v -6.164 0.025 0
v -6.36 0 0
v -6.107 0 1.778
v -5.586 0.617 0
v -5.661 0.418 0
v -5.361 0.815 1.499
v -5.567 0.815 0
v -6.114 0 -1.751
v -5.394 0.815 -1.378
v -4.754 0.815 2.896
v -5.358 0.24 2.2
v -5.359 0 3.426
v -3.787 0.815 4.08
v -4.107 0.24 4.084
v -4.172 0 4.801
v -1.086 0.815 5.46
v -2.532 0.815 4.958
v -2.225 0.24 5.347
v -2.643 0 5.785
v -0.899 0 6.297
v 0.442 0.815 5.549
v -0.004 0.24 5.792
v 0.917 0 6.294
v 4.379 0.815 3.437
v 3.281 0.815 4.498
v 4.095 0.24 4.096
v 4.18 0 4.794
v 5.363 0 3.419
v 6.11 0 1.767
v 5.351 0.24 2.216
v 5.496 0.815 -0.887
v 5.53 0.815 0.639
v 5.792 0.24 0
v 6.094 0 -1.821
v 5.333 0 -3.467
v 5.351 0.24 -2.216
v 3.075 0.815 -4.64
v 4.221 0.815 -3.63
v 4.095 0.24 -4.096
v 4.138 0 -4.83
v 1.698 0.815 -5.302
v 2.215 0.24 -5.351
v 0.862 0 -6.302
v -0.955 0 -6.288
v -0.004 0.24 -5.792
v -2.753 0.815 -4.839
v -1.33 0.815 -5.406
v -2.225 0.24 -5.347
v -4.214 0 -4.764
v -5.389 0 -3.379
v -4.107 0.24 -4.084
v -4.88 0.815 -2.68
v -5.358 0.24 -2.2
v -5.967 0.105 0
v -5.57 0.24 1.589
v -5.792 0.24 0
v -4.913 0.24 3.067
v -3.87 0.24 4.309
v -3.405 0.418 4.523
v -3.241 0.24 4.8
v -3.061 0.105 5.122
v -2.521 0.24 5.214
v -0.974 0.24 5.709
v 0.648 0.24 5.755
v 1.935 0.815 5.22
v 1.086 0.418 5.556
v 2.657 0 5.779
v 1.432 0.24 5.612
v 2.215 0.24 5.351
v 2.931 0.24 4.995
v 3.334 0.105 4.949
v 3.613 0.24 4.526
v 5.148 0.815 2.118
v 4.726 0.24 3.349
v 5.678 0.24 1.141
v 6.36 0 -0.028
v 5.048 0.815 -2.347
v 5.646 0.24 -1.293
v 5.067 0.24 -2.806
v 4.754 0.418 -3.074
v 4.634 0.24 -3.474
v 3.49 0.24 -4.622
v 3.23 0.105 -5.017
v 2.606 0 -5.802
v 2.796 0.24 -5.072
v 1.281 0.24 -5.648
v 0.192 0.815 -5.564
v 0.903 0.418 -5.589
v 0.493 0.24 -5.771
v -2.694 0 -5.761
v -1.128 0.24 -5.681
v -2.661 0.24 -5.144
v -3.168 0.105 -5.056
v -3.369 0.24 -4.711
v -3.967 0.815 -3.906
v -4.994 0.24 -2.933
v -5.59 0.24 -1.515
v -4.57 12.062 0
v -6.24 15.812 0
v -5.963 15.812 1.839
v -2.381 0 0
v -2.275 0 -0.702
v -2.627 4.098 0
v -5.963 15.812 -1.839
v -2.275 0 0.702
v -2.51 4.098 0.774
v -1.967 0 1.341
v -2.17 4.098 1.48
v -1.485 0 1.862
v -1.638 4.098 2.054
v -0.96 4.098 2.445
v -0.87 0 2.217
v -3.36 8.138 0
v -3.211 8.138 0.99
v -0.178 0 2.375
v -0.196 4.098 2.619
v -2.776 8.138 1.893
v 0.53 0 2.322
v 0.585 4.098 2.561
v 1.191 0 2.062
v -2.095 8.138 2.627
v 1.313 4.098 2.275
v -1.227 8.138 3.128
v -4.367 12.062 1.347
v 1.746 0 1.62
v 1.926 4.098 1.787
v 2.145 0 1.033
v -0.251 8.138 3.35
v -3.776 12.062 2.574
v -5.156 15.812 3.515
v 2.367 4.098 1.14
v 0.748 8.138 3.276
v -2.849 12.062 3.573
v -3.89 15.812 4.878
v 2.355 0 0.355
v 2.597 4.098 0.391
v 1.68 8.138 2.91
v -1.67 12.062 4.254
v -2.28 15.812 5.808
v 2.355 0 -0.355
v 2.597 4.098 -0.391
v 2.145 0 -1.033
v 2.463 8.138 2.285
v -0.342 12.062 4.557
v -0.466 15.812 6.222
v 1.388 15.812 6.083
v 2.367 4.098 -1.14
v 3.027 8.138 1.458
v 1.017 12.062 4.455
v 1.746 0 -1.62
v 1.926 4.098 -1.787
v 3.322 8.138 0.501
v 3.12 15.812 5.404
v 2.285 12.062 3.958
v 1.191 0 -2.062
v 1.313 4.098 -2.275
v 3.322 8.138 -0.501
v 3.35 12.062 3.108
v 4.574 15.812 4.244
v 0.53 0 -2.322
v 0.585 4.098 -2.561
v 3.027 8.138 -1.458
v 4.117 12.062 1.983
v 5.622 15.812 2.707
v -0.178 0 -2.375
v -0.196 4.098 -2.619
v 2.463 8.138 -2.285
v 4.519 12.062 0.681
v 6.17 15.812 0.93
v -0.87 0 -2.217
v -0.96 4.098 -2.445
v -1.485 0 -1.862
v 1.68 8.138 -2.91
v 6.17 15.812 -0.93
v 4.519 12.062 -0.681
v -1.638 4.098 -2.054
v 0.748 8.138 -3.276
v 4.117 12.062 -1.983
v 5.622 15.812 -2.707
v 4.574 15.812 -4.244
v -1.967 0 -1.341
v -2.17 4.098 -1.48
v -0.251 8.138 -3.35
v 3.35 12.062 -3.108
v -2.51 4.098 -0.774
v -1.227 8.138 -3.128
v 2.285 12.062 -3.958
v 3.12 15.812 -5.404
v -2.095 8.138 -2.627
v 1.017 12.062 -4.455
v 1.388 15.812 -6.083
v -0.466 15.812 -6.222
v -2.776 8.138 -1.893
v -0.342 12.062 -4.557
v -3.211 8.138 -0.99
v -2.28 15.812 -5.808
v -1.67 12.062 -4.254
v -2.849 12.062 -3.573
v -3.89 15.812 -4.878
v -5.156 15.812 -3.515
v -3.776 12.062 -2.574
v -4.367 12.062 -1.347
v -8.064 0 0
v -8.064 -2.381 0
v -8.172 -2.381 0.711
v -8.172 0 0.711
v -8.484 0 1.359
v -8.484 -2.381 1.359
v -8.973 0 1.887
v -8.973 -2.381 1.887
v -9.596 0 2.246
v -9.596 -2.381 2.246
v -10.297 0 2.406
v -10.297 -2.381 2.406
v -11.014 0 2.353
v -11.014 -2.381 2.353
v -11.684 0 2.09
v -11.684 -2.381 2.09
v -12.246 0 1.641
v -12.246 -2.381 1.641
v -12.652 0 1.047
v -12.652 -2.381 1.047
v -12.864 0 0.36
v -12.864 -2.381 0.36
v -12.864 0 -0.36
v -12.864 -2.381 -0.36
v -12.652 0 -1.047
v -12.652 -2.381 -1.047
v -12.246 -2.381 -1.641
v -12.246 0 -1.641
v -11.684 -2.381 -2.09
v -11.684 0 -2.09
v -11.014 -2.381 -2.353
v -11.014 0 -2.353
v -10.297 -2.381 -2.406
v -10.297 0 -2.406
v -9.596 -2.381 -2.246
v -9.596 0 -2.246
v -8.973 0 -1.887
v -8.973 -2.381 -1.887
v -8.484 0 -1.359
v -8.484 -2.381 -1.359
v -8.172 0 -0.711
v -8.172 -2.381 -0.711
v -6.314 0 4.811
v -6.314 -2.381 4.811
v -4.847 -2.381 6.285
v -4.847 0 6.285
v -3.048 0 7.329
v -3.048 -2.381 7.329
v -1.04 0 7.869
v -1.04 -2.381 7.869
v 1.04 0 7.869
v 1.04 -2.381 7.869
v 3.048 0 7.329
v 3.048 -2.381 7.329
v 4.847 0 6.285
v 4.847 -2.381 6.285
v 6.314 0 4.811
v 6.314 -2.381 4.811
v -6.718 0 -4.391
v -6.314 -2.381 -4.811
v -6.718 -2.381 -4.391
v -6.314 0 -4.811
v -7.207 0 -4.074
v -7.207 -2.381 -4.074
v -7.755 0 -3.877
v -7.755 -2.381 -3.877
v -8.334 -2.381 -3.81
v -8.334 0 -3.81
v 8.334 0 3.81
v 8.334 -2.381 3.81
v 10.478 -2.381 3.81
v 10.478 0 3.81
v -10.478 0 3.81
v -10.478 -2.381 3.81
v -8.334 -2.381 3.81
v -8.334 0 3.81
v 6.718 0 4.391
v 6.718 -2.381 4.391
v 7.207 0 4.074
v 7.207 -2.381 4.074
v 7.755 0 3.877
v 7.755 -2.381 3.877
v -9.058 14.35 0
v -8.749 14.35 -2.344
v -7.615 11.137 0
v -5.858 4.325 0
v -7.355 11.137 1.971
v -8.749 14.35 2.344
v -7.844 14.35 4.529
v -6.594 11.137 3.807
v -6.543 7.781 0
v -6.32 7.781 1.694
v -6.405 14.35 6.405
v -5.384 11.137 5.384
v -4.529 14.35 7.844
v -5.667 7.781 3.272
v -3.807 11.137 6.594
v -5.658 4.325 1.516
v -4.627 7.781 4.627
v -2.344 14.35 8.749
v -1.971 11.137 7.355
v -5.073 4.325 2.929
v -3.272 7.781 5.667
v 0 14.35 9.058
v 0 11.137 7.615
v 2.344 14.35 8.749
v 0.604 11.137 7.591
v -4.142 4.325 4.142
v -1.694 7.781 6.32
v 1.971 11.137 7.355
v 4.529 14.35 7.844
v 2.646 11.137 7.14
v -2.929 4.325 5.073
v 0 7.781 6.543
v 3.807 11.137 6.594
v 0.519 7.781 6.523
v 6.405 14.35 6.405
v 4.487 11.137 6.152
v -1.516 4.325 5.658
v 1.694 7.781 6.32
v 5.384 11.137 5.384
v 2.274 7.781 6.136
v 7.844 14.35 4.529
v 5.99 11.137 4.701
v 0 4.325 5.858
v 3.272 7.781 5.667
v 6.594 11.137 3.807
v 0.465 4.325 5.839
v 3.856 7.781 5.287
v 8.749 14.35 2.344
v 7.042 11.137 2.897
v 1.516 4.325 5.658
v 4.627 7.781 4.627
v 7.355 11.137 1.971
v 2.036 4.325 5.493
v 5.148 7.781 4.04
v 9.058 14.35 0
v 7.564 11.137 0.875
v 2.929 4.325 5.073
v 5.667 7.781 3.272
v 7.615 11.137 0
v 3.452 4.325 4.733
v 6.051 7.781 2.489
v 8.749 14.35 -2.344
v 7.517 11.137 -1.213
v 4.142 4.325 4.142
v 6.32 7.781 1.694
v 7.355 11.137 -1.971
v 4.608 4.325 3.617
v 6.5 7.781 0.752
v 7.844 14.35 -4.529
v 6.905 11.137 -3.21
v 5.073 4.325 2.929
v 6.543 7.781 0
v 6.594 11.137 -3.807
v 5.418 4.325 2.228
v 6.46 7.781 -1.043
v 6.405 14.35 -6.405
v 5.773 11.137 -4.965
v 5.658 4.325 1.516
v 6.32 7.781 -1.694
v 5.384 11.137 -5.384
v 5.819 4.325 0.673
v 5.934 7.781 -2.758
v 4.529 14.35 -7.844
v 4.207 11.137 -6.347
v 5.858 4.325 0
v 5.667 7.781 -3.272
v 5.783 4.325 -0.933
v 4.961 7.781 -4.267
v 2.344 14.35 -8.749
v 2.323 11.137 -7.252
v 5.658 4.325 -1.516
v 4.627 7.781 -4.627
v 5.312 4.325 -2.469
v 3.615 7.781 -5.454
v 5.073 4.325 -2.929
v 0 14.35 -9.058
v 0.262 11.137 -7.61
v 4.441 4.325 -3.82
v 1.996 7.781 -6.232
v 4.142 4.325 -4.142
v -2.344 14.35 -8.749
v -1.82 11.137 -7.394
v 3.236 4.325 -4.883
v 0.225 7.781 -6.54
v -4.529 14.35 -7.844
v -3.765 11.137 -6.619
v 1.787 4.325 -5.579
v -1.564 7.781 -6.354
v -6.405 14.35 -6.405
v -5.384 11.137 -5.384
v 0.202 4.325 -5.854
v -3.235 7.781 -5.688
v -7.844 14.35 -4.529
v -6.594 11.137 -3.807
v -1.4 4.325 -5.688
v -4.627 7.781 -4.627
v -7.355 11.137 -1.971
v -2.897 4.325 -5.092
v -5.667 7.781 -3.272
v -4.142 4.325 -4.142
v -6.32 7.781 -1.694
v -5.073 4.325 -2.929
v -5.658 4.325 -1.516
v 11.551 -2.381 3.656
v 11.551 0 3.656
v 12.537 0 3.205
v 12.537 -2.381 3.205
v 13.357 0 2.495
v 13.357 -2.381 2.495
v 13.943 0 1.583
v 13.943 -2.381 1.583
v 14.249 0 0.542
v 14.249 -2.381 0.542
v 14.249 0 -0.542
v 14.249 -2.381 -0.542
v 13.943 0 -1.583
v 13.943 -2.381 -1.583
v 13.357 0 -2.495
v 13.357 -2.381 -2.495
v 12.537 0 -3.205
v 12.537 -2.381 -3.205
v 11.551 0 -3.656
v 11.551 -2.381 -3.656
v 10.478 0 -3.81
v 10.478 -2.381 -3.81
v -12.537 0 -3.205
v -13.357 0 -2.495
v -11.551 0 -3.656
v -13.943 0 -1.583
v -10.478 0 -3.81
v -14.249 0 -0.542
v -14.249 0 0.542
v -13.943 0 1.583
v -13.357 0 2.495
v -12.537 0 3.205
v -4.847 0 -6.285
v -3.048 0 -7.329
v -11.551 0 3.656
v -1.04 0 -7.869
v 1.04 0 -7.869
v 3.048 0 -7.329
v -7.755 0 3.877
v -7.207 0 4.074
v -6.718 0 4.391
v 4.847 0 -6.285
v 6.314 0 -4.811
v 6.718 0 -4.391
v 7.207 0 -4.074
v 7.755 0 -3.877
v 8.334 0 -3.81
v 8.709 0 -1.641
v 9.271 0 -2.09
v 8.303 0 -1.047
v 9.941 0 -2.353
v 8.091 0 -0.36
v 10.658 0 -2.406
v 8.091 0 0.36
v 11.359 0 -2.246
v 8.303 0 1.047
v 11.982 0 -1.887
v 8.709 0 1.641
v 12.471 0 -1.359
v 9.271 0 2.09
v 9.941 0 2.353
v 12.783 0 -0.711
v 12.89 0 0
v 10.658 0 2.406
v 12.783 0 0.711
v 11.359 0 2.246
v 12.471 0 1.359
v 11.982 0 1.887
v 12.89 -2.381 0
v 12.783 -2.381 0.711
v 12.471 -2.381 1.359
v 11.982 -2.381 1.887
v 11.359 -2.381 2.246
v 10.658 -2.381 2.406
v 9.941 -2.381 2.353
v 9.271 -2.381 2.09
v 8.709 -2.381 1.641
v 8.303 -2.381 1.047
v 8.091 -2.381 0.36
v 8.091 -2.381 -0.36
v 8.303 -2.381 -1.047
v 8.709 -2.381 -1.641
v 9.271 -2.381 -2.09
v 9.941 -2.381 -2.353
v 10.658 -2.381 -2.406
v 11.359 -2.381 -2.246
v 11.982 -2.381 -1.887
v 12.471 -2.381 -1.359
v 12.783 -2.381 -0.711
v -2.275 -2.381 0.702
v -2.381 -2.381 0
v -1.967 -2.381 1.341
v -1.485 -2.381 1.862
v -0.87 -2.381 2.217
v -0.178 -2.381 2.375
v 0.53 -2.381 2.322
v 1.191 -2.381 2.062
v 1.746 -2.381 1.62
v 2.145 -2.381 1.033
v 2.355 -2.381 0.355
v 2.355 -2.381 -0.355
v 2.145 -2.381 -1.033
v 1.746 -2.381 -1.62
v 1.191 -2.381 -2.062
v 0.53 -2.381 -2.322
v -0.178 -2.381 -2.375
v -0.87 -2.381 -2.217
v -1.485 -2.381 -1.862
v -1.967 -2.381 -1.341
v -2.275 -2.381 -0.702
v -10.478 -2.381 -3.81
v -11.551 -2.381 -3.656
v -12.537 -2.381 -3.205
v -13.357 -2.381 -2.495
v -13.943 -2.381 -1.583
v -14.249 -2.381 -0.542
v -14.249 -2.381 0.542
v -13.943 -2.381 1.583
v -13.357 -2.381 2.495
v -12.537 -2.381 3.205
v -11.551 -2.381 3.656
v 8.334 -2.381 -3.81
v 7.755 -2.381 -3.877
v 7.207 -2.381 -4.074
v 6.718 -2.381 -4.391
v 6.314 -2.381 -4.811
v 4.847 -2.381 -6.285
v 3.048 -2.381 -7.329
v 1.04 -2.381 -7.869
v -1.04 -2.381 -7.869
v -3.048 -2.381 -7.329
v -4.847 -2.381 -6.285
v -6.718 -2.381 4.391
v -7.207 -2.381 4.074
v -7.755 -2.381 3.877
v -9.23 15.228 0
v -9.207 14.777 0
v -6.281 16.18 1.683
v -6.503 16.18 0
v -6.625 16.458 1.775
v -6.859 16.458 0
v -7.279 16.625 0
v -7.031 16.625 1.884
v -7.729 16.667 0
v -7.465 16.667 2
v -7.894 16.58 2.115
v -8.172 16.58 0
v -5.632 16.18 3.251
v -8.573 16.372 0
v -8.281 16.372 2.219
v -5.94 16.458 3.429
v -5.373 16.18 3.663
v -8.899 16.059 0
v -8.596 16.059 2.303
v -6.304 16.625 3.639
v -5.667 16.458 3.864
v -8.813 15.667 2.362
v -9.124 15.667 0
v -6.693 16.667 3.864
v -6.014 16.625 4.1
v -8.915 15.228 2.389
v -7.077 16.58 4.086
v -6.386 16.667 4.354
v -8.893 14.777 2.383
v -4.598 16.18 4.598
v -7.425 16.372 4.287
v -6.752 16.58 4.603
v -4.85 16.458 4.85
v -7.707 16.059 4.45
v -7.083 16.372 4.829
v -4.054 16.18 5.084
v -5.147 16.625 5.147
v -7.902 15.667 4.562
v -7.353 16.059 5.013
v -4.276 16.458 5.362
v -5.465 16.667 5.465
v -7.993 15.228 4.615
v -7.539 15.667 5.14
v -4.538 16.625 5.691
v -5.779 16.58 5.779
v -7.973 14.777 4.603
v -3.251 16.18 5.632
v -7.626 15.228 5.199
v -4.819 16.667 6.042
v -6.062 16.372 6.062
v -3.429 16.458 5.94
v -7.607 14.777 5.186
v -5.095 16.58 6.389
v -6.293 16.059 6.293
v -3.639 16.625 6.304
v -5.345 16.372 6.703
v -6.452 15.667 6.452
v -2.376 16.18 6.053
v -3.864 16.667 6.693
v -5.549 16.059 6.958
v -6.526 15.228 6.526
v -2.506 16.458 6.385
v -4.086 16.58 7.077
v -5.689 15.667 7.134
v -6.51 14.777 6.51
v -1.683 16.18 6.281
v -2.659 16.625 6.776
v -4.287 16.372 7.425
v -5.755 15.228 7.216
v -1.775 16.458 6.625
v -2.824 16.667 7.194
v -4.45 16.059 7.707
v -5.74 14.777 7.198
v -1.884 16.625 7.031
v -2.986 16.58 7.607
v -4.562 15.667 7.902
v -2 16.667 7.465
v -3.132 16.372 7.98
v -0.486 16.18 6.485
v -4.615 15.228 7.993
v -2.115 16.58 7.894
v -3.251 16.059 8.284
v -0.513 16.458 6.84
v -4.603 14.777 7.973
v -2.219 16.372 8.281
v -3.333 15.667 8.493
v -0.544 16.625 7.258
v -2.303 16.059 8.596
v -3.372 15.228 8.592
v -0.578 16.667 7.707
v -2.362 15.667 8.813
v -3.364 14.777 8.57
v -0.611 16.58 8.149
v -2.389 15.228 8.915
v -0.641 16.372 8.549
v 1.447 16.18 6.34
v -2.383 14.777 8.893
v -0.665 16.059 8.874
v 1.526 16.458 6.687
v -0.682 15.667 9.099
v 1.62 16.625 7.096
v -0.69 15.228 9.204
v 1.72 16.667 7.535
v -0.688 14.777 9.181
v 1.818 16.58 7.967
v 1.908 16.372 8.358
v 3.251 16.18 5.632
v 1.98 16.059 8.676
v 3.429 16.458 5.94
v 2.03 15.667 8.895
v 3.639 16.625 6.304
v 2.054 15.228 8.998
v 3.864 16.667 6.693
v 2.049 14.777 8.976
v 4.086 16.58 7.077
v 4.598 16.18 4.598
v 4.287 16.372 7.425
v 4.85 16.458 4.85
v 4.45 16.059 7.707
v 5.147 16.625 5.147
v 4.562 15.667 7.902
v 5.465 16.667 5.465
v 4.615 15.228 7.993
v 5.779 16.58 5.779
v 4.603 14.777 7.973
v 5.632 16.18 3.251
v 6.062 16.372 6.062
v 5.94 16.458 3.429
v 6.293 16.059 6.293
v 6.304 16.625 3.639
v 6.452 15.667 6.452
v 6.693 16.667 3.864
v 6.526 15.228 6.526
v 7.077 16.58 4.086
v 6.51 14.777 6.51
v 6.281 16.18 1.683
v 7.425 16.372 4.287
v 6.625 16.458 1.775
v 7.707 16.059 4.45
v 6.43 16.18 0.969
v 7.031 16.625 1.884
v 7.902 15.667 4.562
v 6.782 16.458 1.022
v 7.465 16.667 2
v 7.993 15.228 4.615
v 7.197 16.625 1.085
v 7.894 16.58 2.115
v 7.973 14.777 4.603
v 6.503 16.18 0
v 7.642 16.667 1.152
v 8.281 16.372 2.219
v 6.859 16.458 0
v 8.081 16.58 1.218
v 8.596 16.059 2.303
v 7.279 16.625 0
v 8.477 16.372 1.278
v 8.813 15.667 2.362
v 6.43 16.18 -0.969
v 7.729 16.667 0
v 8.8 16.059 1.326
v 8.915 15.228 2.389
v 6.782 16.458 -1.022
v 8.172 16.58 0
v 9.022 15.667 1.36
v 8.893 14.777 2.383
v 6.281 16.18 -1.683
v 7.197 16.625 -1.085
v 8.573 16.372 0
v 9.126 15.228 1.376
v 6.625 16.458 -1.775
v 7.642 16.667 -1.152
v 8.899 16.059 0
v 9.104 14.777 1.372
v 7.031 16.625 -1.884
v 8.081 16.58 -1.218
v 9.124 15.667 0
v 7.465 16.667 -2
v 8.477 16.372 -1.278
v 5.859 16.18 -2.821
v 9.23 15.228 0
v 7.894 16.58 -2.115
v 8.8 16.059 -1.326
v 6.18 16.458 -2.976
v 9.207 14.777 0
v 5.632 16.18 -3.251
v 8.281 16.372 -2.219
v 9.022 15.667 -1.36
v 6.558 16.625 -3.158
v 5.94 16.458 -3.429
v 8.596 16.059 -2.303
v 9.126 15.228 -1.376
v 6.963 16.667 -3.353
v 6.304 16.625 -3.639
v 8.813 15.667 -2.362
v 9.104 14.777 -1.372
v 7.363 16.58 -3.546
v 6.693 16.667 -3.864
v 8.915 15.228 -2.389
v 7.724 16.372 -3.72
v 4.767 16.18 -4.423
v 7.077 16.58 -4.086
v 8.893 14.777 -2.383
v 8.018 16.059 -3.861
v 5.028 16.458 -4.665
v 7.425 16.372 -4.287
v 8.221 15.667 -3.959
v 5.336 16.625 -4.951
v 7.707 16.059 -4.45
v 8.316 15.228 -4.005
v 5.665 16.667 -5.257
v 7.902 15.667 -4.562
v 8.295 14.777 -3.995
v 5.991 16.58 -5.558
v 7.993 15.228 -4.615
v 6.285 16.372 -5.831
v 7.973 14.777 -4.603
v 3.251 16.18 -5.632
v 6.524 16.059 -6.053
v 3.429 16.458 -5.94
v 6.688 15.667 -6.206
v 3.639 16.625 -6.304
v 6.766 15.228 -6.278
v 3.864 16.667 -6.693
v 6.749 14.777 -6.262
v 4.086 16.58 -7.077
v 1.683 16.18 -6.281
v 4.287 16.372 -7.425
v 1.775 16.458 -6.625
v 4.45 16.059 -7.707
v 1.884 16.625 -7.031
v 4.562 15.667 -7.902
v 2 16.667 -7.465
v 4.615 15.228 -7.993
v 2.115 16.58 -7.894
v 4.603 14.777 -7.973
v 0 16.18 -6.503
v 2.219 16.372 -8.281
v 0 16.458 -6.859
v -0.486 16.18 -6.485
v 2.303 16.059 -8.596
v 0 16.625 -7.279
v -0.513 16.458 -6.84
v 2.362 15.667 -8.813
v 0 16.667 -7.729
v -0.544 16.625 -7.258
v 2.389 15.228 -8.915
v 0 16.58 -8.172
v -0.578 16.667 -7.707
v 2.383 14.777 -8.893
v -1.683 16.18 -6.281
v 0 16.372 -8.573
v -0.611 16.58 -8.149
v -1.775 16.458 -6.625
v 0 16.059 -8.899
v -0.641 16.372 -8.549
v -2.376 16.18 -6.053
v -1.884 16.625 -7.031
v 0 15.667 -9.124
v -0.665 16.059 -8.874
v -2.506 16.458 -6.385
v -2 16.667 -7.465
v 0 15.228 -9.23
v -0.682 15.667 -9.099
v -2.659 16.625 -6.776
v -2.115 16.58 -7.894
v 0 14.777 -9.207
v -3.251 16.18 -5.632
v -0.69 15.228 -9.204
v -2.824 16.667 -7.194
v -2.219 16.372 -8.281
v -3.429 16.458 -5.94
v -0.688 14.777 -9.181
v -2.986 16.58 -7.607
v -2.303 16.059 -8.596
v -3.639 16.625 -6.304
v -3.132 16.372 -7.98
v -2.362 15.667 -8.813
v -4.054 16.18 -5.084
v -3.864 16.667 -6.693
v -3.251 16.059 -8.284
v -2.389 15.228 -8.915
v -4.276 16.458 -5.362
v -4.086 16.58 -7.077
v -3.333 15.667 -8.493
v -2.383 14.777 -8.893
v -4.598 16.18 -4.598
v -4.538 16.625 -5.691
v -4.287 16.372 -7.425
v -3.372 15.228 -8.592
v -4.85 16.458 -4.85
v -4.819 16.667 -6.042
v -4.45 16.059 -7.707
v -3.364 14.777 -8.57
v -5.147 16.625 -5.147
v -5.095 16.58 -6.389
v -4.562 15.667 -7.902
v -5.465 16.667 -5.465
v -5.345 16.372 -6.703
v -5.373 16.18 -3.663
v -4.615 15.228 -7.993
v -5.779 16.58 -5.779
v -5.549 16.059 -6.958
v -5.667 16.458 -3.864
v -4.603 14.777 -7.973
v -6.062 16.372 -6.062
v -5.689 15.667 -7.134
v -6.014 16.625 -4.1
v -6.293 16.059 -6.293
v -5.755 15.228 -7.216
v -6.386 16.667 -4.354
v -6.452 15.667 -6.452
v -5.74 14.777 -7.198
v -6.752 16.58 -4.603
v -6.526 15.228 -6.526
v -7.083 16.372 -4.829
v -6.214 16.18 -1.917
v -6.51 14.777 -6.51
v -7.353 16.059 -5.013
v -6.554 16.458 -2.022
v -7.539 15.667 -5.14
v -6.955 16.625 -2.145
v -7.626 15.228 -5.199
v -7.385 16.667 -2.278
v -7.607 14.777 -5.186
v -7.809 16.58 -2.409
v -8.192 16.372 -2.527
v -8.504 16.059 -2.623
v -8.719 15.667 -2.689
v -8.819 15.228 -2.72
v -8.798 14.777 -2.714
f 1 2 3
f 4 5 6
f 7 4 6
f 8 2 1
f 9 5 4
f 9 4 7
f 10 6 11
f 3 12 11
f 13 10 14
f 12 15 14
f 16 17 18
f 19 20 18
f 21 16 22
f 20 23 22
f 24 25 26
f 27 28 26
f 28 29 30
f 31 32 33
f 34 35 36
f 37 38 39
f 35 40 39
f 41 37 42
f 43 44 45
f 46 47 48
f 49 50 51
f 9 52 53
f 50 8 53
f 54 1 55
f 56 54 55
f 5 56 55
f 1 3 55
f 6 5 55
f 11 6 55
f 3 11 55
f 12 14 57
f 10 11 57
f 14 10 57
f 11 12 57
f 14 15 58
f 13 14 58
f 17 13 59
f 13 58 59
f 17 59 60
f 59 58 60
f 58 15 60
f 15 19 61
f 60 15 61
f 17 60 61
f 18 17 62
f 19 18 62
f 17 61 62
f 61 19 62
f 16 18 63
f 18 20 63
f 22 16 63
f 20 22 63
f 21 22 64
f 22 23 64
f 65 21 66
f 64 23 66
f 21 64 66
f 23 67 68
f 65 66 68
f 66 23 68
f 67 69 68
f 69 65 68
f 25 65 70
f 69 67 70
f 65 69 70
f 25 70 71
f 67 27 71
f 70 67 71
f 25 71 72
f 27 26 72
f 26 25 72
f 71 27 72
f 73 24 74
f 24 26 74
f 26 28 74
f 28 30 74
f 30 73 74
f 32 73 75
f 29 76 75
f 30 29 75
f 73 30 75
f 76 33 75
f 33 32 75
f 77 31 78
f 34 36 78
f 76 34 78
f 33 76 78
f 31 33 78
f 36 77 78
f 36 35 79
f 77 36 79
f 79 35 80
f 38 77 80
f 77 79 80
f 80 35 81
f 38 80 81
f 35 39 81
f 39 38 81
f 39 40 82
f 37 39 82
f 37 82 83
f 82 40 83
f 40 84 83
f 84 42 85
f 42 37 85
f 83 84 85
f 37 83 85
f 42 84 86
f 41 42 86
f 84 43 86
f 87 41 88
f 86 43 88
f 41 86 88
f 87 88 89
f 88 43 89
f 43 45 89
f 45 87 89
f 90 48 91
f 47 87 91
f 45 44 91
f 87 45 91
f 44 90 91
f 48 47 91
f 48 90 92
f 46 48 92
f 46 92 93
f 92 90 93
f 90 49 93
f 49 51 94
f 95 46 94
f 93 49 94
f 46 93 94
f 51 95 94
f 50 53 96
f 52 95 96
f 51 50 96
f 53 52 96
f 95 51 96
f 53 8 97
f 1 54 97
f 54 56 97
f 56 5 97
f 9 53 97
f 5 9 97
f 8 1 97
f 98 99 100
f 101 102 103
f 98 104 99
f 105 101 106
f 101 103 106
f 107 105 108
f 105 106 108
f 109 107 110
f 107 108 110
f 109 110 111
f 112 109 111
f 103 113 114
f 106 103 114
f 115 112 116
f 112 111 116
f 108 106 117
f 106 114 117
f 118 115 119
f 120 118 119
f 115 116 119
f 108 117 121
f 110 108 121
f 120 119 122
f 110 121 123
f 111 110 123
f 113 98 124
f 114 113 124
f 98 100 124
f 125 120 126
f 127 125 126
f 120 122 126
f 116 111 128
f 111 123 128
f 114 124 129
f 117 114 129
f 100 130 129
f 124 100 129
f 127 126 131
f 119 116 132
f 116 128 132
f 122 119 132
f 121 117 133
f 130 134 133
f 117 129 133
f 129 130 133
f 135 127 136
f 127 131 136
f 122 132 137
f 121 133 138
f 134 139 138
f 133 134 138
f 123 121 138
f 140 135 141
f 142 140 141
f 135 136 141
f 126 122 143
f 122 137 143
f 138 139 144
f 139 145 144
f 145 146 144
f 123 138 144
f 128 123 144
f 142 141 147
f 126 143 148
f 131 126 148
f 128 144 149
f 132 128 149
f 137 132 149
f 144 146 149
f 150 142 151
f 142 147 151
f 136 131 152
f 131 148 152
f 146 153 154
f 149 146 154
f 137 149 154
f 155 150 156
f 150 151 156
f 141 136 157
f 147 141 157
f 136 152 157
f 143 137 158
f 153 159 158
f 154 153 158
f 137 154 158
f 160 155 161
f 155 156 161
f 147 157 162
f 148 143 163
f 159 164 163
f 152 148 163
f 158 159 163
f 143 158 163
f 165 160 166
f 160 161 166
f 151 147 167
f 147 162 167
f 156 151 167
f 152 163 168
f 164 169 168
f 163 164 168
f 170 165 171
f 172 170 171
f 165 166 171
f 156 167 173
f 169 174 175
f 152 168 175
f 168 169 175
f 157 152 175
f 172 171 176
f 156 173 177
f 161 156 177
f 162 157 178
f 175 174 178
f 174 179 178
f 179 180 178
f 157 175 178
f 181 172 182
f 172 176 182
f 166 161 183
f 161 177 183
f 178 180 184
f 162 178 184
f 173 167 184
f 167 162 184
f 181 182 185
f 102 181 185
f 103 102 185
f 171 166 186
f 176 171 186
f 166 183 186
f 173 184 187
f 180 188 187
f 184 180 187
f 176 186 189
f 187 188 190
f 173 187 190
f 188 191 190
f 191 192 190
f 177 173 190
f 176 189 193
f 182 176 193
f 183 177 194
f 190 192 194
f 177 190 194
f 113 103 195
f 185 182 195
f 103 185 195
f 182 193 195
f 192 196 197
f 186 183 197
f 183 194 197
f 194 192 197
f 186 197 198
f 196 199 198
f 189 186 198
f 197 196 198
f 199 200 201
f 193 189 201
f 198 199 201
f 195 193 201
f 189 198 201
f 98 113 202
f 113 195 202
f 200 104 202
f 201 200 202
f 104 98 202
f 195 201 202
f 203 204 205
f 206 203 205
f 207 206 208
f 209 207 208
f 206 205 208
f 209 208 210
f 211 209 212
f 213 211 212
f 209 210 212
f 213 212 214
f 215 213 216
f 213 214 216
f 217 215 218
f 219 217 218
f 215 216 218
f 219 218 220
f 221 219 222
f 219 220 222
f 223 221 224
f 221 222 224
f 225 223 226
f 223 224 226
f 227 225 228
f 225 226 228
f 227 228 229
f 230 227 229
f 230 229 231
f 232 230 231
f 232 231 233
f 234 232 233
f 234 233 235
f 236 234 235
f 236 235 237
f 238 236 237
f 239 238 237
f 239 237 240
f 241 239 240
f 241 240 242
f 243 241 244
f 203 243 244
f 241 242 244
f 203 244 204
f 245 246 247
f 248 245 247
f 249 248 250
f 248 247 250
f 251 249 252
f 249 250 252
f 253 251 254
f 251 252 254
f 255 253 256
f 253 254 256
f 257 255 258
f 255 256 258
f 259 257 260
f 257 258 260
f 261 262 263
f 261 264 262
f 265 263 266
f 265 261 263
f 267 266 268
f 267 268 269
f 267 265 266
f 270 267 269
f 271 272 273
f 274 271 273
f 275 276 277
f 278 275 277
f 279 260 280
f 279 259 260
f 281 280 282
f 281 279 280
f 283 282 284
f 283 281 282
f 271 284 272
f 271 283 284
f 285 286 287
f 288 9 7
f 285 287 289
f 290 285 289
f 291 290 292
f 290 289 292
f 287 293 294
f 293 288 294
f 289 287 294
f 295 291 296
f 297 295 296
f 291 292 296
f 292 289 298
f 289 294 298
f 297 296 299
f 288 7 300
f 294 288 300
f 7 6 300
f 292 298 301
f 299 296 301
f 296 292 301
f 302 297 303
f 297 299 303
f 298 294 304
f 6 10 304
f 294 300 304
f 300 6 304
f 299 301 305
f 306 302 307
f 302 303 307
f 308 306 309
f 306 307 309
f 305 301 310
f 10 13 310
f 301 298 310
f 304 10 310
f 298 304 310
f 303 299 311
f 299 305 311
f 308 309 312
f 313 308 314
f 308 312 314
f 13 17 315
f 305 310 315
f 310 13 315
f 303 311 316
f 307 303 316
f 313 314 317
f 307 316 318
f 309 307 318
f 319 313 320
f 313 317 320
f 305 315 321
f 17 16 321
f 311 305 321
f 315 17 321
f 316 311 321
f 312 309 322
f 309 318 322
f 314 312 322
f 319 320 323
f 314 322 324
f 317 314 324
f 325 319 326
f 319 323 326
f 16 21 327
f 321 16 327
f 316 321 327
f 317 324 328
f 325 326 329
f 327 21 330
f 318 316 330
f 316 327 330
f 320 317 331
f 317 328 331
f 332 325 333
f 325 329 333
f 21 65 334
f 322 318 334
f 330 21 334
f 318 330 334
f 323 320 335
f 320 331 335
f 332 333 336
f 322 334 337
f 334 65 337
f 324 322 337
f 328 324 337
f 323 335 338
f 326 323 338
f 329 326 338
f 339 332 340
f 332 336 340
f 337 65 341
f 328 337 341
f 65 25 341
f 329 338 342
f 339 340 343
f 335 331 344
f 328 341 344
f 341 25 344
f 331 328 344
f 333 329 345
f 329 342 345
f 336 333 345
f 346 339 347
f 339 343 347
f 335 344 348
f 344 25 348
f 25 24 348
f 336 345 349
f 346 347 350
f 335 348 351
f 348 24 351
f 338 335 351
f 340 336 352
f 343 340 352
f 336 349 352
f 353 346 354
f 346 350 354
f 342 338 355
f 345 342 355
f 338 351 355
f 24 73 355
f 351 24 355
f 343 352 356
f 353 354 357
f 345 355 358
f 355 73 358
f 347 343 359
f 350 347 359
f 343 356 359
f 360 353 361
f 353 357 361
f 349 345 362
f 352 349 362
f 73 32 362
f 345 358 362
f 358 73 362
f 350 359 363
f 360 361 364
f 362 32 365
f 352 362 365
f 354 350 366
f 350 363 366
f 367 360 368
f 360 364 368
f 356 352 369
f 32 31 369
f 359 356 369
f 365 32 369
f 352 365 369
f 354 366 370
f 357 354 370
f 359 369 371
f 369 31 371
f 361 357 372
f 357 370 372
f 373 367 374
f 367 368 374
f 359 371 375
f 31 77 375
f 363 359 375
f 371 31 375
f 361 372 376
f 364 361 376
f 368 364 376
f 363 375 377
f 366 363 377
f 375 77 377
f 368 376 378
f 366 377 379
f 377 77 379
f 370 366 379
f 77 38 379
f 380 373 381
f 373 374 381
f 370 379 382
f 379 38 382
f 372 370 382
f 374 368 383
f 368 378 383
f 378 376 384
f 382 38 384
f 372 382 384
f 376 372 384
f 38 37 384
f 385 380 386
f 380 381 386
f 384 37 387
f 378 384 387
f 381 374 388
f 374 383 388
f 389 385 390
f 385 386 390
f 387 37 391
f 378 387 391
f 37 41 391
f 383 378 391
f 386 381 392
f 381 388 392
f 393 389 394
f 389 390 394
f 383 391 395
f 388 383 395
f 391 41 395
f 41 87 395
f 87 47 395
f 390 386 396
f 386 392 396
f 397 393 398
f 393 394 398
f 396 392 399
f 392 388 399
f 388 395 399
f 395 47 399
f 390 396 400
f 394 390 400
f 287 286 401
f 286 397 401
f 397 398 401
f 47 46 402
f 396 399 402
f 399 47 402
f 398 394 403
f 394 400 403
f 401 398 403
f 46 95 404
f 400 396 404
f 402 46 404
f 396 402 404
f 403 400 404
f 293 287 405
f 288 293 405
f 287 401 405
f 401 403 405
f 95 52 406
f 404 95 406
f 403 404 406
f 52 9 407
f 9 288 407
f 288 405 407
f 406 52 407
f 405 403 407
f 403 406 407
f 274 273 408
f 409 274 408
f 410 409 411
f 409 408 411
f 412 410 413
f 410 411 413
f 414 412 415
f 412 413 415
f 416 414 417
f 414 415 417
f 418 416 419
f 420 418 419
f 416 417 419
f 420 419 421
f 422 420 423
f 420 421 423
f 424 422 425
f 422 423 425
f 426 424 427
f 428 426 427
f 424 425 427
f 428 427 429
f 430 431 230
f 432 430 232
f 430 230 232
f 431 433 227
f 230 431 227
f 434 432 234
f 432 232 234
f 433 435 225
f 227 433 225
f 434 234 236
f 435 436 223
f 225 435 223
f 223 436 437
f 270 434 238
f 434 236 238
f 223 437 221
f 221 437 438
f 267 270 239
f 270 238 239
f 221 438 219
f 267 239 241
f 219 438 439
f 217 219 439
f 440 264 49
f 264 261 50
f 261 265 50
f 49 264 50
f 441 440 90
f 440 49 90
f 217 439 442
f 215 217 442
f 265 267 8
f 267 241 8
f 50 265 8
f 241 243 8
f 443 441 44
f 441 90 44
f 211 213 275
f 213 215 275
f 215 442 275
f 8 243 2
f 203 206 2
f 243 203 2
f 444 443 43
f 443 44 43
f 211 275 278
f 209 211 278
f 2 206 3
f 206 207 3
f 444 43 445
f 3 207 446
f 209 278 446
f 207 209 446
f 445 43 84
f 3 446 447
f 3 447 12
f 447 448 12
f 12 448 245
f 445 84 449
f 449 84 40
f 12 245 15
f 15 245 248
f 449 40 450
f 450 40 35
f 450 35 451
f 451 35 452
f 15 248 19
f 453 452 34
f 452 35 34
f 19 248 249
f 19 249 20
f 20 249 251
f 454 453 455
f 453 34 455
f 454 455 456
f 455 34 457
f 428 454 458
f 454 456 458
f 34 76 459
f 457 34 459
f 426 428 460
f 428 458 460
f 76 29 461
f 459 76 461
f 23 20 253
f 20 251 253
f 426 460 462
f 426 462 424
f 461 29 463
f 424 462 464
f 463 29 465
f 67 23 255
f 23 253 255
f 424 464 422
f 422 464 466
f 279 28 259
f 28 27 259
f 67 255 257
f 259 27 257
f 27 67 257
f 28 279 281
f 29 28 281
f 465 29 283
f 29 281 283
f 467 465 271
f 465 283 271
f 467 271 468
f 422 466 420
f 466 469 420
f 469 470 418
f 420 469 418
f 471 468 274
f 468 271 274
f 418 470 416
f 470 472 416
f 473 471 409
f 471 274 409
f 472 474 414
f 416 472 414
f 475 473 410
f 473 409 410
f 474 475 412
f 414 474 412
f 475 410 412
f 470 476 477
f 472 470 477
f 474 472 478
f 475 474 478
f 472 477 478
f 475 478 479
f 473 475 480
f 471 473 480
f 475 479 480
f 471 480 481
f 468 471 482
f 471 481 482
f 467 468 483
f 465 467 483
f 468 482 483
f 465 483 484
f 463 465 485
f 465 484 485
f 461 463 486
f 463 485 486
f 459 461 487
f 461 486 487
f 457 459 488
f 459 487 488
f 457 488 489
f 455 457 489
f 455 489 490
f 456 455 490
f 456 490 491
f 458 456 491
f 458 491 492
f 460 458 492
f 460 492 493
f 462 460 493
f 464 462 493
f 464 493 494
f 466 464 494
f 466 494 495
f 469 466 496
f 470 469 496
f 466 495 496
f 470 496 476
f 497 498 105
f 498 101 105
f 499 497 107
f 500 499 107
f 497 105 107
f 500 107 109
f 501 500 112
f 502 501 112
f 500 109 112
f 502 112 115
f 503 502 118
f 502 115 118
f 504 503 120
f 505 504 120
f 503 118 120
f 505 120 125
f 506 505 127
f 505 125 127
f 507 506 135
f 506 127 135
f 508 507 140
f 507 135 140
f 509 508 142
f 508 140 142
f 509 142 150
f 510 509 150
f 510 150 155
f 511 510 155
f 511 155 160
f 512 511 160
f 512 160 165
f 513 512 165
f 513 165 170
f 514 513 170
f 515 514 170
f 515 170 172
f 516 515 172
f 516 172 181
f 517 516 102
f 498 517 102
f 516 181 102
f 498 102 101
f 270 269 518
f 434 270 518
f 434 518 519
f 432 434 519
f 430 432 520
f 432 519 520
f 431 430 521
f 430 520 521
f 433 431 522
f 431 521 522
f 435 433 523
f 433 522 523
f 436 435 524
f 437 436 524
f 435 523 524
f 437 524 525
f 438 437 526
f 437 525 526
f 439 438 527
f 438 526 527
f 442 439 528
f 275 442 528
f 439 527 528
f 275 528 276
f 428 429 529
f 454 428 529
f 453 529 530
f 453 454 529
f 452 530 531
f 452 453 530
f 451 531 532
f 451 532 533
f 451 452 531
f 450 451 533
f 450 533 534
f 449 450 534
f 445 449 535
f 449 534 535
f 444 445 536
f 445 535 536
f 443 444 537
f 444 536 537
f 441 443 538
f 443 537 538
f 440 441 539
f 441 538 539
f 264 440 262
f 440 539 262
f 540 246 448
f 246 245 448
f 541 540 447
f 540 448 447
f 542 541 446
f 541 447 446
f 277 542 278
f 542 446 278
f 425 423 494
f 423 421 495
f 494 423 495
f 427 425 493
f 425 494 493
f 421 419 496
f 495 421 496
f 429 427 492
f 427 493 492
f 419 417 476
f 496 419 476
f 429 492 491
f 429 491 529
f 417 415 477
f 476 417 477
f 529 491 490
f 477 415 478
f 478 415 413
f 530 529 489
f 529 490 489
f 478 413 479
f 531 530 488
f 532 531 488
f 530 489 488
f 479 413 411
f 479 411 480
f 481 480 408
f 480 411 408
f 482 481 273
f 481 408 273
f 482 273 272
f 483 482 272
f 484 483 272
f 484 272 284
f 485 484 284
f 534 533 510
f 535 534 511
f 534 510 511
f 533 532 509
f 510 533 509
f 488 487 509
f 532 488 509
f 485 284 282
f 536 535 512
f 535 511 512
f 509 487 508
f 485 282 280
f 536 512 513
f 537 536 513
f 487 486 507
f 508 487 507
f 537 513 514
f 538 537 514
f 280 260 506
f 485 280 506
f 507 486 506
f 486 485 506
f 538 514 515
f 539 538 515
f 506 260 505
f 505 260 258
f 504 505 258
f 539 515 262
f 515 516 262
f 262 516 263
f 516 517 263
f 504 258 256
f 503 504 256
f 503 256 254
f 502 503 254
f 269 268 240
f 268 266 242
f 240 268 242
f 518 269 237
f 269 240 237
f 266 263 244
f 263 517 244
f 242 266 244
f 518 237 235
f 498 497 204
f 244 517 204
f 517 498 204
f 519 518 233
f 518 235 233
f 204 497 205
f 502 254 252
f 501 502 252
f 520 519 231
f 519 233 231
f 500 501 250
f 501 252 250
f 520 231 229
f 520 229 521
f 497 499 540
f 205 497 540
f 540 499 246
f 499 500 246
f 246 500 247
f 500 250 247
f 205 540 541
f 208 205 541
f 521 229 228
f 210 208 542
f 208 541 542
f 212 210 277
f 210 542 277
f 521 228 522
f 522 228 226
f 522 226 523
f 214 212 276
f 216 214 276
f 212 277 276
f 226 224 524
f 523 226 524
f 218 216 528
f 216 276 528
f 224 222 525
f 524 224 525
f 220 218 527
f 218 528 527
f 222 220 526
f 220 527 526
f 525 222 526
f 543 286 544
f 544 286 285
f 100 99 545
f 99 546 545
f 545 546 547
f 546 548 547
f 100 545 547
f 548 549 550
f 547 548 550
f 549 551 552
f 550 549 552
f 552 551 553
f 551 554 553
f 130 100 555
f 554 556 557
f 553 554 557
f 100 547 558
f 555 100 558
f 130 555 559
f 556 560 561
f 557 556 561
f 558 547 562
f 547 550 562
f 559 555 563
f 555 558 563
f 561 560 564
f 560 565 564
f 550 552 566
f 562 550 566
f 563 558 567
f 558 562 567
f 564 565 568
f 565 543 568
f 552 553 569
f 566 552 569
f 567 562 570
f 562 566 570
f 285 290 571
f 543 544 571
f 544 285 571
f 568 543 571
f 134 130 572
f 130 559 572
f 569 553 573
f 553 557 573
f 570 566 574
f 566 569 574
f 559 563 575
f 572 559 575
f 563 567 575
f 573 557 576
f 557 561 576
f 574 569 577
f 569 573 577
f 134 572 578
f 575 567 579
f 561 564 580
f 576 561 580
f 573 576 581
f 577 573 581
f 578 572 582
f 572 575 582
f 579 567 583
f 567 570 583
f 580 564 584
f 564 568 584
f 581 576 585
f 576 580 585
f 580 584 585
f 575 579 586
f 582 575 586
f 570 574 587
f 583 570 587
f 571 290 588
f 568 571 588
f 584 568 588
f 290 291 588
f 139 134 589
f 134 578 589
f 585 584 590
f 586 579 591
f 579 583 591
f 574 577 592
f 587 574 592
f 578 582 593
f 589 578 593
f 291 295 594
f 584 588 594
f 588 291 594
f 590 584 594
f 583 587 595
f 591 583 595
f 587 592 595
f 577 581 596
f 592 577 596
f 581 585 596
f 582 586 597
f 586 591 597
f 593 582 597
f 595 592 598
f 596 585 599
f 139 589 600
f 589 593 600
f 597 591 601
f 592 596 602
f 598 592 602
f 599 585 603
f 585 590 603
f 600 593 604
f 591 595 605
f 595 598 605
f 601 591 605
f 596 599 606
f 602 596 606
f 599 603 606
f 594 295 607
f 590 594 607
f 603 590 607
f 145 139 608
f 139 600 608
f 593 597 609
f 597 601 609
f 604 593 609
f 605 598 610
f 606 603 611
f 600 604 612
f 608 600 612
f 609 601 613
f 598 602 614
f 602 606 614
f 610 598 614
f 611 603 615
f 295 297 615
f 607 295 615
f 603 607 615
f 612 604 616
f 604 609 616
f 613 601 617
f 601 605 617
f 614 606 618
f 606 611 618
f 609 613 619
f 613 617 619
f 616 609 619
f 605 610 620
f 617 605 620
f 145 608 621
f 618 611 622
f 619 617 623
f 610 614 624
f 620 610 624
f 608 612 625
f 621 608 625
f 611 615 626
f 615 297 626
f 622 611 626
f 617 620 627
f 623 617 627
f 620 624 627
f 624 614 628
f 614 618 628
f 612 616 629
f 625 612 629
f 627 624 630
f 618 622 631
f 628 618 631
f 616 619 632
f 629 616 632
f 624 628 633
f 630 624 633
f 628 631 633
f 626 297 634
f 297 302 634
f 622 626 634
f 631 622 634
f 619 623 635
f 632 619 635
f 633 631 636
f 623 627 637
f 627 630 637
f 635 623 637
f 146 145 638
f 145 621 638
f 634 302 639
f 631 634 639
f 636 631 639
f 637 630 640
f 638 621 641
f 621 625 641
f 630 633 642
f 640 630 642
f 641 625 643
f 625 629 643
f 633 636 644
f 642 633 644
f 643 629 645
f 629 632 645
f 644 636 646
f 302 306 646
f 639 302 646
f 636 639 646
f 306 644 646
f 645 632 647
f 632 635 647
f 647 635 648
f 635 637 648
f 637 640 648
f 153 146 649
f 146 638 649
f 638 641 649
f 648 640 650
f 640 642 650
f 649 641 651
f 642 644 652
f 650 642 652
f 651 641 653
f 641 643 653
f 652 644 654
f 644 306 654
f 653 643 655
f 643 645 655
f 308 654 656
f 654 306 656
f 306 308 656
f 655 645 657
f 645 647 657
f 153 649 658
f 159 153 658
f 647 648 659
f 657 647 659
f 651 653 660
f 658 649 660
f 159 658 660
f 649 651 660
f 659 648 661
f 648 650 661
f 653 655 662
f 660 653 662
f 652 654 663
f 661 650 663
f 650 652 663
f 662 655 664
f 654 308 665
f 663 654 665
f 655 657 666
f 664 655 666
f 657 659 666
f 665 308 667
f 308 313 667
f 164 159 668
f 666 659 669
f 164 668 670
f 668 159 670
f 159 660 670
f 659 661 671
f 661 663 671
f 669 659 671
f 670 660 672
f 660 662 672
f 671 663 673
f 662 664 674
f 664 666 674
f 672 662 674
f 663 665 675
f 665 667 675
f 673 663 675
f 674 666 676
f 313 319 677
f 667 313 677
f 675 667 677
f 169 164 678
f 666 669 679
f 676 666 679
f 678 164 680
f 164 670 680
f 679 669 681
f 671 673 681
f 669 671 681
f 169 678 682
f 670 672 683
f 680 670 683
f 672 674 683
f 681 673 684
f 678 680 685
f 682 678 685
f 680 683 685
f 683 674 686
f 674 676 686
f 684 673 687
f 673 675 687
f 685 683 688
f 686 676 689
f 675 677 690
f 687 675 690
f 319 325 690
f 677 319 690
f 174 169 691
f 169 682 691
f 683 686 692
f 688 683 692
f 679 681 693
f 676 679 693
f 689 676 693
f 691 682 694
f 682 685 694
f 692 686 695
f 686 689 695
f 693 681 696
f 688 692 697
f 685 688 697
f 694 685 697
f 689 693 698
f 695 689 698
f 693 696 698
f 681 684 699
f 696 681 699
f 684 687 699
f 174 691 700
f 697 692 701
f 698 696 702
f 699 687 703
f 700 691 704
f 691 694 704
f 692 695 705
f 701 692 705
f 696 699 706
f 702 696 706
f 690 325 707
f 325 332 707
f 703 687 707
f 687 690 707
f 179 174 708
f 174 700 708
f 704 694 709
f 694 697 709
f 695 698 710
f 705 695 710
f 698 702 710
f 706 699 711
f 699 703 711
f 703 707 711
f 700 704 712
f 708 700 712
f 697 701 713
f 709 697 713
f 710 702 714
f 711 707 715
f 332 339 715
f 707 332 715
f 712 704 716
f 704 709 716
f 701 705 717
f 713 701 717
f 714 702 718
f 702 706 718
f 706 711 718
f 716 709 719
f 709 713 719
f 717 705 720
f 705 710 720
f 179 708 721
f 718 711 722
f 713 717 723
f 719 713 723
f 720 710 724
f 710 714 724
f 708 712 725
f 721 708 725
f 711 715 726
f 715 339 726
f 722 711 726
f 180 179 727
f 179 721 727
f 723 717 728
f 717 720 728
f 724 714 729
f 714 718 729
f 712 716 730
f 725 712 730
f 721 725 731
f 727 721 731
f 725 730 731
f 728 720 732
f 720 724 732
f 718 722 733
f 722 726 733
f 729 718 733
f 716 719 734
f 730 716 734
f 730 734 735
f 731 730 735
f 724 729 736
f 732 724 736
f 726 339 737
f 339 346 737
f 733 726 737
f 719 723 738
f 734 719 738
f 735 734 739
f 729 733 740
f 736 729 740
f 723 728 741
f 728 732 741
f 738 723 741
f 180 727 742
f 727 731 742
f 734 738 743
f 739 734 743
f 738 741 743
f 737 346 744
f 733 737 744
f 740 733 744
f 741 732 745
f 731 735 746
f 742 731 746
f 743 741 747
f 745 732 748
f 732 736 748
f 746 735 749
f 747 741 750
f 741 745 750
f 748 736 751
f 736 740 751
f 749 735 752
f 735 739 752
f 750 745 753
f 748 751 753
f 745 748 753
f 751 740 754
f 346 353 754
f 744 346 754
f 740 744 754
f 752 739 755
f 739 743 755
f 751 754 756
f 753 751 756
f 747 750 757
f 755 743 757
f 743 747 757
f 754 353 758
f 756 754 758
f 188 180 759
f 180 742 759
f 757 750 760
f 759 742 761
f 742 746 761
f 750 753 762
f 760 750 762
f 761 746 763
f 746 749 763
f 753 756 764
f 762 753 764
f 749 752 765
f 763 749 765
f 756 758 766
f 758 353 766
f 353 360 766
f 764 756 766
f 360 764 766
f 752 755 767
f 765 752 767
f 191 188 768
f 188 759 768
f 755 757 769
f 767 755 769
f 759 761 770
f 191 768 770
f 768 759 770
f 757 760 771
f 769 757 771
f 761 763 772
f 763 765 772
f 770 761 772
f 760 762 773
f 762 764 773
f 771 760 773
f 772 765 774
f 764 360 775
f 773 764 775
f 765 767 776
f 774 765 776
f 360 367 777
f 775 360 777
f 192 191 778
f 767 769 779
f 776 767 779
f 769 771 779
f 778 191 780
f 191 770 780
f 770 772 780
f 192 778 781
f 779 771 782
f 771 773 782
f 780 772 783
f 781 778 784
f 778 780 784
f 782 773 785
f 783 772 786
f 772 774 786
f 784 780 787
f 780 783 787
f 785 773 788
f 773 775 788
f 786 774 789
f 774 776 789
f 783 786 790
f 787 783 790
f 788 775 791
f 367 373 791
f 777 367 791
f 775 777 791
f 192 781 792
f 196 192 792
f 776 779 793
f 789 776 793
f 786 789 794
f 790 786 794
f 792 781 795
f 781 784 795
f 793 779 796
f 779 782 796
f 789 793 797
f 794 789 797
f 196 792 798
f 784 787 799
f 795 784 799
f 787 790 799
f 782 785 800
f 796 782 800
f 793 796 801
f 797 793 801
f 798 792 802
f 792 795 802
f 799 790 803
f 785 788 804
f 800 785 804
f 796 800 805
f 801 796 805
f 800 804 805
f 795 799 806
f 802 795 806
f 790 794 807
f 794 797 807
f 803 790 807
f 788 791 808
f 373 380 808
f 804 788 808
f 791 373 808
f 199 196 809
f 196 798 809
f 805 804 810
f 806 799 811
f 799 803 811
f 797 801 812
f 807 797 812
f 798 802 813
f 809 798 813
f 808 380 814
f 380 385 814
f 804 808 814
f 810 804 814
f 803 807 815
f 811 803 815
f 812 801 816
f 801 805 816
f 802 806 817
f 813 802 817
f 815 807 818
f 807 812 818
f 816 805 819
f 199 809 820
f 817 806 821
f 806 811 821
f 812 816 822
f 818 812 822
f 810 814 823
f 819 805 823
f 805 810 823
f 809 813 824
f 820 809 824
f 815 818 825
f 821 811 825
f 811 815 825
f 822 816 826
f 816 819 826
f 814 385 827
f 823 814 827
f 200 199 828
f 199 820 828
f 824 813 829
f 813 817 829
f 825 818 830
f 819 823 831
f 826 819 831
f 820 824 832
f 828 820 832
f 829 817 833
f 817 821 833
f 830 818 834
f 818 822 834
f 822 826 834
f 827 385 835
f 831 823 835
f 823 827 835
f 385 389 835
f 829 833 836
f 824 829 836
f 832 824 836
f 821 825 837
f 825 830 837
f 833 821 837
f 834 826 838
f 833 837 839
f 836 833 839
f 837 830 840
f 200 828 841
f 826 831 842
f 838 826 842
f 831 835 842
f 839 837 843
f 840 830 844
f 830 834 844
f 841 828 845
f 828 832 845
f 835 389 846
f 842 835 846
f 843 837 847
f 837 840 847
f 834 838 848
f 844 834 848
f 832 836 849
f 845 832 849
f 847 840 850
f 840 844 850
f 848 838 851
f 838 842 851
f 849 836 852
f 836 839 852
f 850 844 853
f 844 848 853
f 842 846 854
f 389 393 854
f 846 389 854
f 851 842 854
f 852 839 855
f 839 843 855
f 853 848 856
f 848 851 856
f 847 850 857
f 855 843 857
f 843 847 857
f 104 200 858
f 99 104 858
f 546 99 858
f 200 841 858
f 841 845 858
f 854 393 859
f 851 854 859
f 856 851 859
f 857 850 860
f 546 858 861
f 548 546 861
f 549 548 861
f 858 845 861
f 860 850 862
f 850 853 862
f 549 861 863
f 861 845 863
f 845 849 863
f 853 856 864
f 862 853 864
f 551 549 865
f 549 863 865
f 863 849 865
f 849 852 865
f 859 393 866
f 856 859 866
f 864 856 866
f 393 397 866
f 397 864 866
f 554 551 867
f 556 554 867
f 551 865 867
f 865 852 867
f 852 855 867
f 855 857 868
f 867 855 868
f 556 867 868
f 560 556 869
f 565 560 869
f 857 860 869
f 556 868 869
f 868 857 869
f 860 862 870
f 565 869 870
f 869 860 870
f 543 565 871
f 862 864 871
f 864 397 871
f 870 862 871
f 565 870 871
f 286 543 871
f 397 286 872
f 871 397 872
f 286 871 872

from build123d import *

# Parameters (mm, degrees)
SKETCH2_OUTSIDE_W  = 39.511
SKETCH2_OUTSIDE_H  = 39.51
SKETCH2_OUTSIDE_R  = 2.413
CUT_EXTRUDE1_DEPTH = 2.38125
FILLET1_R          = 2.54
FILLET2_R          = 0.79375


with BuildPart() as part:
    # Sketch1 → Revolve1 (revolve)
    with BuildSketch(Plane.XY):
        with BuildLine():
            Line((-5.55625, 0), (-14.2875, 0))
            Line((-14.2875, 0), (-14.2875, -2.38125))
            Line((-14.2875, -2.38125), (-2.38125, -2.38125))
            Line((-2.38125, -2.38125), (-2.38125, 0))
            ThreePointArc((-2.38125, 0), (-3.359821243, 8.138211612), (-6.239746425, 15.812462121))
            ThreePointArc((-6.239746425, 15.812462121), (-8.380030966, 16.49032242), (-9.057891265, 14.350037879))
            ThreePointArc((-9.057891265, 14.350037879), (-6.444317544, 7.385544643), (-5.55625, 0))
        make_face()
    revolve(axis=Axis((0, -2.38125, 0), (0, 1, 0)))

    # Sketch2 outside → Cut-Extrude1 (cut)
    with BuildSketch(Plane.XZ.offset(2.38125)):
        with Locations((0.0005, 0)):
            Rectangle(SKETCH2_OUTSIDE_W, SKETCH2_OUTSIDE_H)
        with BuildLine():
            Line((-10.4775, 3.81), (-6.963318623, 3.81))
            ThreePointArc((-6.963318623, 3.81), (0, 7.9375), (6.963318623, 3.81))
            Line((6.963318623, 3.81), (10.4775, 3.81))
            ThreePointArc((10.4775, 3.81), (14.2875, 0), (10.4775, -3.81))
            Line((10.4775, -3.81), (6.963318623, -3.81))
            ThreePointArc((6.963318623, -3.81), (0, -7.9375), (-6.963318623, -3.81))
            Line((-6.963318623, -3.81), (-10.4775, -3.81))
            ThreePointArc((-10.4775, -3.81), (-14.2875, 0), (-10.4775, 3.81))
        make_face(mode=Mode.SUBTRACT)
        with Locations((-10.4775, 0)):
            Circle(SKETCH2_OUTSIDE_R)
        with Locations((10.4775, 0)):
            Circle(SKETCH2_OUTSIDE_R)
    extrude(amount=-CUT_EXTRUDE1_DEPTH, mode=Mode.SUBTRACT)

    # Fillet1
    fillet1_edges = [part.edges().sort_by_distance(p)[0] for p in [
        (-6.963318623, -1.190625, -3.81),
        (6.963318623, -1.190625, -3.81),
        (6.963318623, -1.190625, 3.81),
        (-6.963318623, -1.190625, 3.81),
    ]]
    fillet(fillet1_edges, radius=FILLET1_R)

    # Fillet2
    fillet2_edges = [part.edges().sort_by_distance(p)[0] for p in [
        (5.55625, 0, 0),
    ]]
    fillet(fillet2_edges, radius=FILLET2_R)


solid = part.part
